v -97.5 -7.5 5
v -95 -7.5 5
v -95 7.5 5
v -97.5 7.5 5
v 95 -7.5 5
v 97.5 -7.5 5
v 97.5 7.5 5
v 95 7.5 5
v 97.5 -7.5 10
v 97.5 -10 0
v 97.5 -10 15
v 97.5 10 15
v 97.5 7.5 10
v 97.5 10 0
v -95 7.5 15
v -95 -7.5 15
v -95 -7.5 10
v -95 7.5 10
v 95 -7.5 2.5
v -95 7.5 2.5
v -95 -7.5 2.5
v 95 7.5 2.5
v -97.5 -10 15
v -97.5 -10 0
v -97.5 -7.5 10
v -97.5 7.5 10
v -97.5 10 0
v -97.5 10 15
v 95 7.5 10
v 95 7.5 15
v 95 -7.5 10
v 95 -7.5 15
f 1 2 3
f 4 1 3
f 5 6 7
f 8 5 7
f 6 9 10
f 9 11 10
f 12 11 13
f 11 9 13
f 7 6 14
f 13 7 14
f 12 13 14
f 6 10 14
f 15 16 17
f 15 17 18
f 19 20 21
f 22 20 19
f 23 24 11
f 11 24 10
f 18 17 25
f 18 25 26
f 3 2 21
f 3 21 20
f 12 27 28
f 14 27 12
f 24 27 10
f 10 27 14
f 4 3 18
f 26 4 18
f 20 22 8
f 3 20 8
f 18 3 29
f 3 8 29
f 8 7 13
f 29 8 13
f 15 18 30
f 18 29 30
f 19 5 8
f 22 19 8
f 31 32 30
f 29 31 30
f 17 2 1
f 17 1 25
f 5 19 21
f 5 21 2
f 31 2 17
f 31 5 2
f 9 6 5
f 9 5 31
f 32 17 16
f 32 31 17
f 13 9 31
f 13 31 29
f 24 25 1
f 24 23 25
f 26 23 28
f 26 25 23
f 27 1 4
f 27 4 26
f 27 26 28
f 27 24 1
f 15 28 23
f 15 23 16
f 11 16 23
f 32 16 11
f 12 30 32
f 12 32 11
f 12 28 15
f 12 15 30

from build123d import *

# Parameters (mm, degrees)
F0_W     = 195
F0_H     = 20
F1_DEPTH = 15
F2_W     = 190
F2_H     = 15
F3_DEPTH = 12.5
F4_W     = 15
F4_H     = 5
F5_DEPTH = 195.001


with BuildPart() as f1:
    # F0 (on Top) → F1 (new body)
    with BuildSketch(Plane.XY):
        Rectangle(F0_W, F0_H)
    extrude(amount=F1_DEPTH)

    # F2 (on face) → F3 (cut)
    with BuildSketch(Plane.XY.offset(15)):
        Rectangle(F2_W, F2_H)
    extrude(amount=-F3_DEPTH, mode=Mode.SUBTRACT)

    # F4 (on face) → F5 (cut, through all)
    with BuildSketch(Plane.YZ.offset(97.5)):
        with Locations((0, 7.5)):
            Rectangle(F4_W, F4_H)
    extrude(amount=-F5_DEPTH, mode=Mode.SUBTRACT)


solid = f1.part
